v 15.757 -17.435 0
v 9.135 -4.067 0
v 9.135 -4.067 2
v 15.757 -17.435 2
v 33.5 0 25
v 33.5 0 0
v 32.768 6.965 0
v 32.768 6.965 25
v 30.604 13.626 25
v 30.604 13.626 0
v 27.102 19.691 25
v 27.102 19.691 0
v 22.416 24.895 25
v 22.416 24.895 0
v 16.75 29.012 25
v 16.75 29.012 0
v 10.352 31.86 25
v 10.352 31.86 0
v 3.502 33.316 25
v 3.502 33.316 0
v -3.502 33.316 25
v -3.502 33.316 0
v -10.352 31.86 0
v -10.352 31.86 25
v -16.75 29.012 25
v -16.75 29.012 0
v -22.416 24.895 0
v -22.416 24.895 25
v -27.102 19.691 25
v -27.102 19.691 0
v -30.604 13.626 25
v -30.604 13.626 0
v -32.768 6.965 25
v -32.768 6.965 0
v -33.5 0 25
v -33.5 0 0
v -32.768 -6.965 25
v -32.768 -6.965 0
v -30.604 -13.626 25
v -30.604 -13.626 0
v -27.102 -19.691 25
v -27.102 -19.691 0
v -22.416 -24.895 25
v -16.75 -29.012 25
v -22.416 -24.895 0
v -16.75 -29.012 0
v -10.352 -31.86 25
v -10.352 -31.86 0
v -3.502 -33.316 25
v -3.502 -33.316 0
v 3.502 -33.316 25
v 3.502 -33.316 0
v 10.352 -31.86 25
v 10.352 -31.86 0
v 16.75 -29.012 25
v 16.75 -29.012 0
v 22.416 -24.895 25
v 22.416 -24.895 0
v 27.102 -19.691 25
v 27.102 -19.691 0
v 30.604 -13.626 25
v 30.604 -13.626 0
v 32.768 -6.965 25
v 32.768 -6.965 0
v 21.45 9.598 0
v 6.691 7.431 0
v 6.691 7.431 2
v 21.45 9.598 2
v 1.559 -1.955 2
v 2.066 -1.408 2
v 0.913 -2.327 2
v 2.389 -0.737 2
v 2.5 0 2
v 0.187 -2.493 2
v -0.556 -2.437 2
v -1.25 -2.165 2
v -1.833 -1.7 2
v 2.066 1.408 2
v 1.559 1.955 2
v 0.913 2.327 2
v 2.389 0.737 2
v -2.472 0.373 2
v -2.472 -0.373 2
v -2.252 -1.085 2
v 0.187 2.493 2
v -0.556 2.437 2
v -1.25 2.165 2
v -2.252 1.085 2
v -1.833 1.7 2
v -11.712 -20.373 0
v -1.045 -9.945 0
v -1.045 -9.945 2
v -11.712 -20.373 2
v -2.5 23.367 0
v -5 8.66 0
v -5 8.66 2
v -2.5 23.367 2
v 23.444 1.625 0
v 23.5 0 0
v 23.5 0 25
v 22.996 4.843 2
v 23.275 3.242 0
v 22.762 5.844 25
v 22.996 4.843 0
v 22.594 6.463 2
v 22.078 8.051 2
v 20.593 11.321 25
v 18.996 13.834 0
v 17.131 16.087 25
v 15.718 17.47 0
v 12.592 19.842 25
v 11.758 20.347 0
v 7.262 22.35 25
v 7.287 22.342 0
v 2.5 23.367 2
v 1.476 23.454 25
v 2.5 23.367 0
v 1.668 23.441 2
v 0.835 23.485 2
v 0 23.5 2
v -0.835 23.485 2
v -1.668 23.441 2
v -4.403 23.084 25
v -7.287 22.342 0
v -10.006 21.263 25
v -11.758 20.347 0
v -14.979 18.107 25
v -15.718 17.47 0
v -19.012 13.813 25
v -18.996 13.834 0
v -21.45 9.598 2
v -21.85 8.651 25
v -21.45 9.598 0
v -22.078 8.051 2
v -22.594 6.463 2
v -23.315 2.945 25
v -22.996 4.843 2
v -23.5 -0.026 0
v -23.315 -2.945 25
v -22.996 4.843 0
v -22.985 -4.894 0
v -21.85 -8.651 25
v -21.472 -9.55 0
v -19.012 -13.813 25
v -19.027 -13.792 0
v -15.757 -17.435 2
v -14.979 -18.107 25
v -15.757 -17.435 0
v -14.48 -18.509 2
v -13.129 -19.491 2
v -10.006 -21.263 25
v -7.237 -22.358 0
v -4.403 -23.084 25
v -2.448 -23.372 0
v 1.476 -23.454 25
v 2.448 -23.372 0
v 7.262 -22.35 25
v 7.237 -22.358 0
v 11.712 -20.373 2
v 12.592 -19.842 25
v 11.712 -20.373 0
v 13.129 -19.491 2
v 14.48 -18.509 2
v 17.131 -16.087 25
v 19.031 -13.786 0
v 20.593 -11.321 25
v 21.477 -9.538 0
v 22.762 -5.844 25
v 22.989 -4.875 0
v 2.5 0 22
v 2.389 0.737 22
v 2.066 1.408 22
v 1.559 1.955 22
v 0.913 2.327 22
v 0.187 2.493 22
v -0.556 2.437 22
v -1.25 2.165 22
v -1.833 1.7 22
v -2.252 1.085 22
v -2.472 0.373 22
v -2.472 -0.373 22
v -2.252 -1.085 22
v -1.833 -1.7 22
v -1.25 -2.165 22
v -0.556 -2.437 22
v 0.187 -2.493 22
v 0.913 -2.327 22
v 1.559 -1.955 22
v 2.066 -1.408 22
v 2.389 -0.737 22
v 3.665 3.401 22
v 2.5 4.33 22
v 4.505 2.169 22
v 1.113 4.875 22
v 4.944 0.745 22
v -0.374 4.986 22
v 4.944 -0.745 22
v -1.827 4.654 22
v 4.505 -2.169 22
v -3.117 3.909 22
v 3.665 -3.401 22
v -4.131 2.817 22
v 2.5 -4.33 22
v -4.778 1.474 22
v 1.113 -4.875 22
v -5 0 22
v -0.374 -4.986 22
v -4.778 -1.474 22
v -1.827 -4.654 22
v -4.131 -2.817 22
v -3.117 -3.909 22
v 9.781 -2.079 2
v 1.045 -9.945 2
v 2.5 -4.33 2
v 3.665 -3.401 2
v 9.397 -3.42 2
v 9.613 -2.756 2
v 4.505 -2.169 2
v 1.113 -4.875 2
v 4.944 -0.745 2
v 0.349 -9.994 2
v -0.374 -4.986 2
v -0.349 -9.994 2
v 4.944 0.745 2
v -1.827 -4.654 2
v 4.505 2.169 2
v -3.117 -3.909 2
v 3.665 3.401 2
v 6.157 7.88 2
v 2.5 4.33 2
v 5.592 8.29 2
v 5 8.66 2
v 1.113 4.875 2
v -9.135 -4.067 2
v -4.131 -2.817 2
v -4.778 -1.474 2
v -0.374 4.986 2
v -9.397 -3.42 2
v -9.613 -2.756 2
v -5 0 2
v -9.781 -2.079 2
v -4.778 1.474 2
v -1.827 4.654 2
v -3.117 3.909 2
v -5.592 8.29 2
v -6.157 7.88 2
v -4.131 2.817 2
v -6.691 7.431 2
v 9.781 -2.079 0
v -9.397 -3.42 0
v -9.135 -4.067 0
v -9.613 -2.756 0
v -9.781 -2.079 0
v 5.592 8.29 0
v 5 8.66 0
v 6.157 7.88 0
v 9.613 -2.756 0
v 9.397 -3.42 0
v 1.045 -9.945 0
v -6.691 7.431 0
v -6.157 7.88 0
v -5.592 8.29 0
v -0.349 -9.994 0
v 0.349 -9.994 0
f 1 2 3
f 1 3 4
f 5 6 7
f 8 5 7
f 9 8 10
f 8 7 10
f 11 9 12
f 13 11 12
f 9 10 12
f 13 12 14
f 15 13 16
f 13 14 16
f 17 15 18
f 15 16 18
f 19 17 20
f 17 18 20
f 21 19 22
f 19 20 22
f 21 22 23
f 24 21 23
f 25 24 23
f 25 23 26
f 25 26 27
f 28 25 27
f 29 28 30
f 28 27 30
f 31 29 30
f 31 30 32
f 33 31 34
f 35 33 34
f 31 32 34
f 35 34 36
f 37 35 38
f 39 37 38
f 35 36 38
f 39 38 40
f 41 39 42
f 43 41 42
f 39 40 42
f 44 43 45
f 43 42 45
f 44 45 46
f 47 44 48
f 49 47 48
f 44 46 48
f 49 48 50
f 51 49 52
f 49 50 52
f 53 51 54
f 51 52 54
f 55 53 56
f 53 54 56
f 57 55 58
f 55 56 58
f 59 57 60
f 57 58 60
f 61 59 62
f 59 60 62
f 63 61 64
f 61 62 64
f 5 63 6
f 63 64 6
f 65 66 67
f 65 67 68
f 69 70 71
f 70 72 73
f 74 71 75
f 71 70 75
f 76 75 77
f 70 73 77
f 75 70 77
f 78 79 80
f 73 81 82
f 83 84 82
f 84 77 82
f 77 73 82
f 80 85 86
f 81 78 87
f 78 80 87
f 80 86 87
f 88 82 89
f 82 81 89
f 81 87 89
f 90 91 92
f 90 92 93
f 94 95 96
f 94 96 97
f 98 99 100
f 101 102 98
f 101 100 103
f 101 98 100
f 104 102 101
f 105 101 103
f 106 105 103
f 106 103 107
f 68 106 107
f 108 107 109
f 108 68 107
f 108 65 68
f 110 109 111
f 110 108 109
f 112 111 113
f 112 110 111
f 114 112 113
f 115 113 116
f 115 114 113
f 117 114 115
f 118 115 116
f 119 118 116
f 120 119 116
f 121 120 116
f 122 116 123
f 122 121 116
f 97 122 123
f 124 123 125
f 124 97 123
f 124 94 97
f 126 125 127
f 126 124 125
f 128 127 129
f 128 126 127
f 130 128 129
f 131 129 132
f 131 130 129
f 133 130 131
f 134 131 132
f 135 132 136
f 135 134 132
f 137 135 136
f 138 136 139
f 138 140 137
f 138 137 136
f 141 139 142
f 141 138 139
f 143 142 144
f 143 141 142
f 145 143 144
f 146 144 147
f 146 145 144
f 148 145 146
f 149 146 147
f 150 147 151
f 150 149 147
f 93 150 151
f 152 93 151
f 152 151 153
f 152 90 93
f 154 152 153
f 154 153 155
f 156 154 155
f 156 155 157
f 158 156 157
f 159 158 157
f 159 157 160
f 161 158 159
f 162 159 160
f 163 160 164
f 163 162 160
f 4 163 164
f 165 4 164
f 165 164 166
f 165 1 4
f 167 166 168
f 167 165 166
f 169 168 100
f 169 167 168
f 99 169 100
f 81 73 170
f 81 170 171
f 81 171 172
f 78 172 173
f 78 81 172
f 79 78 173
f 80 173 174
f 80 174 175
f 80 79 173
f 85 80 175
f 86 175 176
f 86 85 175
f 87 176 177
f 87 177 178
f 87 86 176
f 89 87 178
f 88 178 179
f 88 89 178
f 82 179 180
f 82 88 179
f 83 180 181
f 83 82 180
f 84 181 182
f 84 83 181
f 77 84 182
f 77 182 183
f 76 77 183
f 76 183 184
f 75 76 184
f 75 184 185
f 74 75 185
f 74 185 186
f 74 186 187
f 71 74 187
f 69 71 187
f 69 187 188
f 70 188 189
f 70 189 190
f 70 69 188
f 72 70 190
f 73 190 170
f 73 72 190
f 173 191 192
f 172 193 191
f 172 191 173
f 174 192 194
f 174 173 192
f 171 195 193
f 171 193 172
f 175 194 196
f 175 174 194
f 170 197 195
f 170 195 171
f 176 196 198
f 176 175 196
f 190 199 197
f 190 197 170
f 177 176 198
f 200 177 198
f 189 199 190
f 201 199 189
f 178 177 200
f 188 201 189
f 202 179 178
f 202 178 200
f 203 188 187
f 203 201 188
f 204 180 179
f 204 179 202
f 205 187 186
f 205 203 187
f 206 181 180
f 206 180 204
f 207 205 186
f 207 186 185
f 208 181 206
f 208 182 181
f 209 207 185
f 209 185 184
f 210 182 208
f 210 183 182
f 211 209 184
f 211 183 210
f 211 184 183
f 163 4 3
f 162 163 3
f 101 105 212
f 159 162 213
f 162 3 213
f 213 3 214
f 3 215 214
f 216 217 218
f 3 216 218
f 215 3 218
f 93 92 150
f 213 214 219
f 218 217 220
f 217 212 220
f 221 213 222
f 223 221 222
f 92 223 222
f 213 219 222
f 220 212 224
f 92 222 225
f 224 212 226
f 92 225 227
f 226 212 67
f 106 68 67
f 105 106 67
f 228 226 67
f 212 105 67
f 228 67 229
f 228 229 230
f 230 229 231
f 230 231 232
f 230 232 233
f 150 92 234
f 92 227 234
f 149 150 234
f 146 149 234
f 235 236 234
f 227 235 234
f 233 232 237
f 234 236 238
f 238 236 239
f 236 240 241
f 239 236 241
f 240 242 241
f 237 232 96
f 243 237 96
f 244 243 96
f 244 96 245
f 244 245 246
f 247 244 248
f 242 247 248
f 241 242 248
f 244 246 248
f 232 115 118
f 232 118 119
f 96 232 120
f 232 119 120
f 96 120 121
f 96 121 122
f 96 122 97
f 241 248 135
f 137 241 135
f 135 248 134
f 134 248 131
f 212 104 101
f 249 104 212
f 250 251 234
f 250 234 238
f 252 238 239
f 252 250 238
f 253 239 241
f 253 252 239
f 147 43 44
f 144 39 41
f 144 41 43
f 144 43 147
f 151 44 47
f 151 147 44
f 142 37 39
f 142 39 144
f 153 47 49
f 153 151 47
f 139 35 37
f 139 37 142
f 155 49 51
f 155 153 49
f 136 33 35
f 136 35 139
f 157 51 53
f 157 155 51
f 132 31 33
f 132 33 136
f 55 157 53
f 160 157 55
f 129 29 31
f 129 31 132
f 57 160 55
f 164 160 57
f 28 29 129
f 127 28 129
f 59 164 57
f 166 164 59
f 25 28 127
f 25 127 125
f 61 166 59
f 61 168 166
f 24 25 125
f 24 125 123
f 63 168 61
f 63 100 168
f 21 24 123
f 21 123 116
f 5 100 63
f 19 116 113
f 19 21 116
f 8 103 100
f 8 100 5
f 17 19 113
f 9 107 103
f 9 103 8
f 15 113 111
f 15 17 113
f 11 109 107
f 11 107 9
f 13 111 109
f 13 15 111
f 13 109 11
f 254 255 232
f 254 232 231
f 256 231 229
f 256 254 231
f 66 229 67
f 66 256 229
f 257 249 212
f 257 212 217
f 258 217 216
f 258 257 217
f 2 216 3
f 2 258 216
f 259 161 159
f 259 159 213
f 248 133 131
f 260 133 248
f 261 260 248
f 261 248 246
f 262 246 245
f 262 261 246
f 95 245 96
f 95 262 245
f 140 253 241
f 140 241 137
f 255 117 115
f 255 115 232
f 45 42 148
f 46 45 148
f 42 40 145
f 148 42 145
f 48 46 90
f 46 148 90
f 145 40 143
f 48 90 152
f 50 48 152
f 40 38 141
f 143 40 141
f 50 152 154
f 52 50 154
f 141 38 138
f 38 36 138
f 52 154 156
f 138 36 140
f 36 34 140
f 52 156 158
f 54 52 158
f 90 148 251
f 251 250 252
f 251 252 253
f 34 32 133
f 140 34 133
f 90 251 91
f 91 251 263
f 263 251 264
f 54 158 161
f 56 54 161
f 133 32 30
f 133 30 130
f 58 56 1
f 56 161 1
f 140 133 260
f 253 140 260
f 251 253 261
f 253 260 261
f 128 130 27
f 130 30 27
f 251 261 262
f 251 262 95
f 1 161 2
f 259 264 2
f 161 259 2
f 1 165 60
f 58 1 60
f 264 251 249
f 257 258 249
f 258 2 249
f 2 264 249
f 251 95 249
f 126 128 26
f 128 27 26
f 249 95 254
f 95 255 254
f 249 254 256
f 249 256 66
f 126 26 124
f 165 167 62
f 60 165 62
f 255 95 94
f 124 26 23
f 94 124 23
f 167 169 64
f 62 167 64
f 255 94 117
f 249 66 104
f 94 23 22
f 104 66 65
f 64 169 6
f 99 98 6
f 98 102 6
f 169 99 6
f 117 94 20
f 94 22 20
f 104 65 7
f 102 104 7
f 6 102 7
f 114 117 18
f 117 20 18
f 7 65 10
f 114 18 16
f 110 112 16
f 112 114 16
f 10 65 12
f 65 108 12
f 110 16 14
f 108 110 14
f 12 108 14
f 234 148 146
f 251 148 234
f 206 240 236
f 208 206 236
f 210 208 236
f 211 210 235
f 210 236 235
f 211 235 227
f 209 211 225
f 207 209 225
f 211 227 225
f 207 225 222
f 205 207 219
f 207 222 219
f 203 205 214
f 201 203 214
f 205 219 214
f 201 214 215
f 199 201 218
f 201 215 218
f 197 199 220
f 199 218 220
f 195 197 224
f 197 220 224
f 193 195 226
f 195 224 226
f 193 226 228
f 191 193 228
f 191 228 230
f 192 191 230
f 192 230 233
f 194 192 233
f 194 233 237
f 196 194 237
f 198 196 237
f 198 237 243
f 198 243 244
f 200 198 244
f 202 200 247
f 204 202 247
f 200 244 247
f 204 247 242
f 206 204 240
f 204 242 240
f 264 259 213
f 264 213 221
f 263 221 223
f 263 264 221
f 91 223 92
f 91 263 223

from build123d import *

# Parameters (mm, degrees)
SKETCH_1_R      = 33.5
SKETCH_1_R_2    = 23.5
EXTRUDE_1_DEPTH = 25
SKETCH_2_R      = 10
EXTRUDE_2_DEPTH = 2
SKETCH_3_R      = 5
SKETCH_3_R_2    = 2.5
EXTRUDE_3_DEPTH = 20


with BuildPart() as part:
    # 草圖1 → 填料-伸長1 (new body)
    with BuildSketch(Plane.XY):
        Circle(SKETCH_1_R)
        Circle(SKETCH_1_R_2, mode=Mode.SUBTRACT)
    extrude(amount=EXTRUDE_1_DEPTH)

    # 草圖2 → 填料-伸長2 (add)
    with BuildSketch(Plane(origin=(0, 0, 0), x_dir=(-1, 0, 0), z_dir=(0, 0, -1))):
        with BuildLine():
            ThreePointArc((-5, 8.660254038), (-2.588190451, 9.659258263), (0, 10))
            Line((0, 10), (0, 23.5))
            ThreePointArc((0, 23.5), (-1.251777149, 23.46663704), (-2.5, 23.366642891))
            Line((-2.5, 23.366642891), (-5, 8.660254038))
        make_face()
        with BuildLine():
            Line((0, 23.5), (0, 10))
            ThreePointArc((0, 10), (2.588190451, 9.659258263), (5, 8.660254038))
            Line((5, 8.660254038), (2.5, 23.366642891))
            ThreePointArc((2.5, 23.366642891), (1.251777149, 23.46663704), (0, 23.5))
        make_face()
        Circle(SKETCH_2_R)
        with BuildLine():
            ThreePointArc((-9.781476007, -2.079116908), (-9.510565163, 3.090169944), (-6.691306064, 7.431448255))
            Line((-6.691306064, 7.431448255), (-21.4504555, 9.598331046))
            ThreePointArc((-21.4504555, 9.598331046), (-22.349828133, 7.261899368), (-22.995540471, 4.843048464))
            Line((-22.995540471, 4.843048464), (-9.781476007, -2.079116908))
        make_face()
        with BuildLine():
            ThreePointArc((-1.045284633, -9.945218954), (-5.877852523, -8.090169944), (-9.135454576, -4.067366431))
            Line((-9.135454576, -4.067366431), (-15.757110573, -17.43454807))
            ThreePointArc((-15.757110573, -17.43454807), (-13.812953429, -19.011899368), (-11.712025601, -20.373474331))
            Line((-11.712025601, -20.373474331), (-1.045284633, -9.945218954))
        make_face()
        with BuildLine():
            Line((15.757110573, -17.43454807), (9.135454576, -4.067366431))
            ThreePointArc((9.135454576, -4.067366431), (5.877852523, -8.090169944), (1.045284633, -9.945218954))
            Line((1.045284633, -9.945218954), (11.712025601, -20.373474331))
            ThreePointArc((11.712025601, -20.373474331), (13.812953429, -19.011899368), (15.757110573, -17.43454807))
        make_face()
        with BuildLine():
            Line((21.4504555, 9.598331046), (6.691306064, 7.431448255))
            ThreePointArc((6.691306064, 7.431448255), (9.135454576, 4.067366431), (10, 0))
            ThreePointArc((10, 0), (9.945218954, -1.045284633), (9.781476007, -2.079116908))
            Line((9.781476007, -2.079116908), (22.995540471, 4.843048464))
            ThreePointArc((22.995540471, 4.843048464), (22.349828133, 7.261899368), (21.4504555, 9.598331046))
        make_face()
    extrude(amount=-EXTRUDE_2_DEPTH)

    # 草圖3 → 填料-伸長3 (add)
    with BuildSketch(Plane.XY.offset(2)):
        with Locations(Location((0, 0, 0), (0, 0, 180))):
            Circle(SKETCH_3_R)
        Circle(SKETCH_3_R_2, mode=Mode.SUBTRACT)
    extrude(amount=EXTRUDE_3_DEPTH)


solid = part.part
